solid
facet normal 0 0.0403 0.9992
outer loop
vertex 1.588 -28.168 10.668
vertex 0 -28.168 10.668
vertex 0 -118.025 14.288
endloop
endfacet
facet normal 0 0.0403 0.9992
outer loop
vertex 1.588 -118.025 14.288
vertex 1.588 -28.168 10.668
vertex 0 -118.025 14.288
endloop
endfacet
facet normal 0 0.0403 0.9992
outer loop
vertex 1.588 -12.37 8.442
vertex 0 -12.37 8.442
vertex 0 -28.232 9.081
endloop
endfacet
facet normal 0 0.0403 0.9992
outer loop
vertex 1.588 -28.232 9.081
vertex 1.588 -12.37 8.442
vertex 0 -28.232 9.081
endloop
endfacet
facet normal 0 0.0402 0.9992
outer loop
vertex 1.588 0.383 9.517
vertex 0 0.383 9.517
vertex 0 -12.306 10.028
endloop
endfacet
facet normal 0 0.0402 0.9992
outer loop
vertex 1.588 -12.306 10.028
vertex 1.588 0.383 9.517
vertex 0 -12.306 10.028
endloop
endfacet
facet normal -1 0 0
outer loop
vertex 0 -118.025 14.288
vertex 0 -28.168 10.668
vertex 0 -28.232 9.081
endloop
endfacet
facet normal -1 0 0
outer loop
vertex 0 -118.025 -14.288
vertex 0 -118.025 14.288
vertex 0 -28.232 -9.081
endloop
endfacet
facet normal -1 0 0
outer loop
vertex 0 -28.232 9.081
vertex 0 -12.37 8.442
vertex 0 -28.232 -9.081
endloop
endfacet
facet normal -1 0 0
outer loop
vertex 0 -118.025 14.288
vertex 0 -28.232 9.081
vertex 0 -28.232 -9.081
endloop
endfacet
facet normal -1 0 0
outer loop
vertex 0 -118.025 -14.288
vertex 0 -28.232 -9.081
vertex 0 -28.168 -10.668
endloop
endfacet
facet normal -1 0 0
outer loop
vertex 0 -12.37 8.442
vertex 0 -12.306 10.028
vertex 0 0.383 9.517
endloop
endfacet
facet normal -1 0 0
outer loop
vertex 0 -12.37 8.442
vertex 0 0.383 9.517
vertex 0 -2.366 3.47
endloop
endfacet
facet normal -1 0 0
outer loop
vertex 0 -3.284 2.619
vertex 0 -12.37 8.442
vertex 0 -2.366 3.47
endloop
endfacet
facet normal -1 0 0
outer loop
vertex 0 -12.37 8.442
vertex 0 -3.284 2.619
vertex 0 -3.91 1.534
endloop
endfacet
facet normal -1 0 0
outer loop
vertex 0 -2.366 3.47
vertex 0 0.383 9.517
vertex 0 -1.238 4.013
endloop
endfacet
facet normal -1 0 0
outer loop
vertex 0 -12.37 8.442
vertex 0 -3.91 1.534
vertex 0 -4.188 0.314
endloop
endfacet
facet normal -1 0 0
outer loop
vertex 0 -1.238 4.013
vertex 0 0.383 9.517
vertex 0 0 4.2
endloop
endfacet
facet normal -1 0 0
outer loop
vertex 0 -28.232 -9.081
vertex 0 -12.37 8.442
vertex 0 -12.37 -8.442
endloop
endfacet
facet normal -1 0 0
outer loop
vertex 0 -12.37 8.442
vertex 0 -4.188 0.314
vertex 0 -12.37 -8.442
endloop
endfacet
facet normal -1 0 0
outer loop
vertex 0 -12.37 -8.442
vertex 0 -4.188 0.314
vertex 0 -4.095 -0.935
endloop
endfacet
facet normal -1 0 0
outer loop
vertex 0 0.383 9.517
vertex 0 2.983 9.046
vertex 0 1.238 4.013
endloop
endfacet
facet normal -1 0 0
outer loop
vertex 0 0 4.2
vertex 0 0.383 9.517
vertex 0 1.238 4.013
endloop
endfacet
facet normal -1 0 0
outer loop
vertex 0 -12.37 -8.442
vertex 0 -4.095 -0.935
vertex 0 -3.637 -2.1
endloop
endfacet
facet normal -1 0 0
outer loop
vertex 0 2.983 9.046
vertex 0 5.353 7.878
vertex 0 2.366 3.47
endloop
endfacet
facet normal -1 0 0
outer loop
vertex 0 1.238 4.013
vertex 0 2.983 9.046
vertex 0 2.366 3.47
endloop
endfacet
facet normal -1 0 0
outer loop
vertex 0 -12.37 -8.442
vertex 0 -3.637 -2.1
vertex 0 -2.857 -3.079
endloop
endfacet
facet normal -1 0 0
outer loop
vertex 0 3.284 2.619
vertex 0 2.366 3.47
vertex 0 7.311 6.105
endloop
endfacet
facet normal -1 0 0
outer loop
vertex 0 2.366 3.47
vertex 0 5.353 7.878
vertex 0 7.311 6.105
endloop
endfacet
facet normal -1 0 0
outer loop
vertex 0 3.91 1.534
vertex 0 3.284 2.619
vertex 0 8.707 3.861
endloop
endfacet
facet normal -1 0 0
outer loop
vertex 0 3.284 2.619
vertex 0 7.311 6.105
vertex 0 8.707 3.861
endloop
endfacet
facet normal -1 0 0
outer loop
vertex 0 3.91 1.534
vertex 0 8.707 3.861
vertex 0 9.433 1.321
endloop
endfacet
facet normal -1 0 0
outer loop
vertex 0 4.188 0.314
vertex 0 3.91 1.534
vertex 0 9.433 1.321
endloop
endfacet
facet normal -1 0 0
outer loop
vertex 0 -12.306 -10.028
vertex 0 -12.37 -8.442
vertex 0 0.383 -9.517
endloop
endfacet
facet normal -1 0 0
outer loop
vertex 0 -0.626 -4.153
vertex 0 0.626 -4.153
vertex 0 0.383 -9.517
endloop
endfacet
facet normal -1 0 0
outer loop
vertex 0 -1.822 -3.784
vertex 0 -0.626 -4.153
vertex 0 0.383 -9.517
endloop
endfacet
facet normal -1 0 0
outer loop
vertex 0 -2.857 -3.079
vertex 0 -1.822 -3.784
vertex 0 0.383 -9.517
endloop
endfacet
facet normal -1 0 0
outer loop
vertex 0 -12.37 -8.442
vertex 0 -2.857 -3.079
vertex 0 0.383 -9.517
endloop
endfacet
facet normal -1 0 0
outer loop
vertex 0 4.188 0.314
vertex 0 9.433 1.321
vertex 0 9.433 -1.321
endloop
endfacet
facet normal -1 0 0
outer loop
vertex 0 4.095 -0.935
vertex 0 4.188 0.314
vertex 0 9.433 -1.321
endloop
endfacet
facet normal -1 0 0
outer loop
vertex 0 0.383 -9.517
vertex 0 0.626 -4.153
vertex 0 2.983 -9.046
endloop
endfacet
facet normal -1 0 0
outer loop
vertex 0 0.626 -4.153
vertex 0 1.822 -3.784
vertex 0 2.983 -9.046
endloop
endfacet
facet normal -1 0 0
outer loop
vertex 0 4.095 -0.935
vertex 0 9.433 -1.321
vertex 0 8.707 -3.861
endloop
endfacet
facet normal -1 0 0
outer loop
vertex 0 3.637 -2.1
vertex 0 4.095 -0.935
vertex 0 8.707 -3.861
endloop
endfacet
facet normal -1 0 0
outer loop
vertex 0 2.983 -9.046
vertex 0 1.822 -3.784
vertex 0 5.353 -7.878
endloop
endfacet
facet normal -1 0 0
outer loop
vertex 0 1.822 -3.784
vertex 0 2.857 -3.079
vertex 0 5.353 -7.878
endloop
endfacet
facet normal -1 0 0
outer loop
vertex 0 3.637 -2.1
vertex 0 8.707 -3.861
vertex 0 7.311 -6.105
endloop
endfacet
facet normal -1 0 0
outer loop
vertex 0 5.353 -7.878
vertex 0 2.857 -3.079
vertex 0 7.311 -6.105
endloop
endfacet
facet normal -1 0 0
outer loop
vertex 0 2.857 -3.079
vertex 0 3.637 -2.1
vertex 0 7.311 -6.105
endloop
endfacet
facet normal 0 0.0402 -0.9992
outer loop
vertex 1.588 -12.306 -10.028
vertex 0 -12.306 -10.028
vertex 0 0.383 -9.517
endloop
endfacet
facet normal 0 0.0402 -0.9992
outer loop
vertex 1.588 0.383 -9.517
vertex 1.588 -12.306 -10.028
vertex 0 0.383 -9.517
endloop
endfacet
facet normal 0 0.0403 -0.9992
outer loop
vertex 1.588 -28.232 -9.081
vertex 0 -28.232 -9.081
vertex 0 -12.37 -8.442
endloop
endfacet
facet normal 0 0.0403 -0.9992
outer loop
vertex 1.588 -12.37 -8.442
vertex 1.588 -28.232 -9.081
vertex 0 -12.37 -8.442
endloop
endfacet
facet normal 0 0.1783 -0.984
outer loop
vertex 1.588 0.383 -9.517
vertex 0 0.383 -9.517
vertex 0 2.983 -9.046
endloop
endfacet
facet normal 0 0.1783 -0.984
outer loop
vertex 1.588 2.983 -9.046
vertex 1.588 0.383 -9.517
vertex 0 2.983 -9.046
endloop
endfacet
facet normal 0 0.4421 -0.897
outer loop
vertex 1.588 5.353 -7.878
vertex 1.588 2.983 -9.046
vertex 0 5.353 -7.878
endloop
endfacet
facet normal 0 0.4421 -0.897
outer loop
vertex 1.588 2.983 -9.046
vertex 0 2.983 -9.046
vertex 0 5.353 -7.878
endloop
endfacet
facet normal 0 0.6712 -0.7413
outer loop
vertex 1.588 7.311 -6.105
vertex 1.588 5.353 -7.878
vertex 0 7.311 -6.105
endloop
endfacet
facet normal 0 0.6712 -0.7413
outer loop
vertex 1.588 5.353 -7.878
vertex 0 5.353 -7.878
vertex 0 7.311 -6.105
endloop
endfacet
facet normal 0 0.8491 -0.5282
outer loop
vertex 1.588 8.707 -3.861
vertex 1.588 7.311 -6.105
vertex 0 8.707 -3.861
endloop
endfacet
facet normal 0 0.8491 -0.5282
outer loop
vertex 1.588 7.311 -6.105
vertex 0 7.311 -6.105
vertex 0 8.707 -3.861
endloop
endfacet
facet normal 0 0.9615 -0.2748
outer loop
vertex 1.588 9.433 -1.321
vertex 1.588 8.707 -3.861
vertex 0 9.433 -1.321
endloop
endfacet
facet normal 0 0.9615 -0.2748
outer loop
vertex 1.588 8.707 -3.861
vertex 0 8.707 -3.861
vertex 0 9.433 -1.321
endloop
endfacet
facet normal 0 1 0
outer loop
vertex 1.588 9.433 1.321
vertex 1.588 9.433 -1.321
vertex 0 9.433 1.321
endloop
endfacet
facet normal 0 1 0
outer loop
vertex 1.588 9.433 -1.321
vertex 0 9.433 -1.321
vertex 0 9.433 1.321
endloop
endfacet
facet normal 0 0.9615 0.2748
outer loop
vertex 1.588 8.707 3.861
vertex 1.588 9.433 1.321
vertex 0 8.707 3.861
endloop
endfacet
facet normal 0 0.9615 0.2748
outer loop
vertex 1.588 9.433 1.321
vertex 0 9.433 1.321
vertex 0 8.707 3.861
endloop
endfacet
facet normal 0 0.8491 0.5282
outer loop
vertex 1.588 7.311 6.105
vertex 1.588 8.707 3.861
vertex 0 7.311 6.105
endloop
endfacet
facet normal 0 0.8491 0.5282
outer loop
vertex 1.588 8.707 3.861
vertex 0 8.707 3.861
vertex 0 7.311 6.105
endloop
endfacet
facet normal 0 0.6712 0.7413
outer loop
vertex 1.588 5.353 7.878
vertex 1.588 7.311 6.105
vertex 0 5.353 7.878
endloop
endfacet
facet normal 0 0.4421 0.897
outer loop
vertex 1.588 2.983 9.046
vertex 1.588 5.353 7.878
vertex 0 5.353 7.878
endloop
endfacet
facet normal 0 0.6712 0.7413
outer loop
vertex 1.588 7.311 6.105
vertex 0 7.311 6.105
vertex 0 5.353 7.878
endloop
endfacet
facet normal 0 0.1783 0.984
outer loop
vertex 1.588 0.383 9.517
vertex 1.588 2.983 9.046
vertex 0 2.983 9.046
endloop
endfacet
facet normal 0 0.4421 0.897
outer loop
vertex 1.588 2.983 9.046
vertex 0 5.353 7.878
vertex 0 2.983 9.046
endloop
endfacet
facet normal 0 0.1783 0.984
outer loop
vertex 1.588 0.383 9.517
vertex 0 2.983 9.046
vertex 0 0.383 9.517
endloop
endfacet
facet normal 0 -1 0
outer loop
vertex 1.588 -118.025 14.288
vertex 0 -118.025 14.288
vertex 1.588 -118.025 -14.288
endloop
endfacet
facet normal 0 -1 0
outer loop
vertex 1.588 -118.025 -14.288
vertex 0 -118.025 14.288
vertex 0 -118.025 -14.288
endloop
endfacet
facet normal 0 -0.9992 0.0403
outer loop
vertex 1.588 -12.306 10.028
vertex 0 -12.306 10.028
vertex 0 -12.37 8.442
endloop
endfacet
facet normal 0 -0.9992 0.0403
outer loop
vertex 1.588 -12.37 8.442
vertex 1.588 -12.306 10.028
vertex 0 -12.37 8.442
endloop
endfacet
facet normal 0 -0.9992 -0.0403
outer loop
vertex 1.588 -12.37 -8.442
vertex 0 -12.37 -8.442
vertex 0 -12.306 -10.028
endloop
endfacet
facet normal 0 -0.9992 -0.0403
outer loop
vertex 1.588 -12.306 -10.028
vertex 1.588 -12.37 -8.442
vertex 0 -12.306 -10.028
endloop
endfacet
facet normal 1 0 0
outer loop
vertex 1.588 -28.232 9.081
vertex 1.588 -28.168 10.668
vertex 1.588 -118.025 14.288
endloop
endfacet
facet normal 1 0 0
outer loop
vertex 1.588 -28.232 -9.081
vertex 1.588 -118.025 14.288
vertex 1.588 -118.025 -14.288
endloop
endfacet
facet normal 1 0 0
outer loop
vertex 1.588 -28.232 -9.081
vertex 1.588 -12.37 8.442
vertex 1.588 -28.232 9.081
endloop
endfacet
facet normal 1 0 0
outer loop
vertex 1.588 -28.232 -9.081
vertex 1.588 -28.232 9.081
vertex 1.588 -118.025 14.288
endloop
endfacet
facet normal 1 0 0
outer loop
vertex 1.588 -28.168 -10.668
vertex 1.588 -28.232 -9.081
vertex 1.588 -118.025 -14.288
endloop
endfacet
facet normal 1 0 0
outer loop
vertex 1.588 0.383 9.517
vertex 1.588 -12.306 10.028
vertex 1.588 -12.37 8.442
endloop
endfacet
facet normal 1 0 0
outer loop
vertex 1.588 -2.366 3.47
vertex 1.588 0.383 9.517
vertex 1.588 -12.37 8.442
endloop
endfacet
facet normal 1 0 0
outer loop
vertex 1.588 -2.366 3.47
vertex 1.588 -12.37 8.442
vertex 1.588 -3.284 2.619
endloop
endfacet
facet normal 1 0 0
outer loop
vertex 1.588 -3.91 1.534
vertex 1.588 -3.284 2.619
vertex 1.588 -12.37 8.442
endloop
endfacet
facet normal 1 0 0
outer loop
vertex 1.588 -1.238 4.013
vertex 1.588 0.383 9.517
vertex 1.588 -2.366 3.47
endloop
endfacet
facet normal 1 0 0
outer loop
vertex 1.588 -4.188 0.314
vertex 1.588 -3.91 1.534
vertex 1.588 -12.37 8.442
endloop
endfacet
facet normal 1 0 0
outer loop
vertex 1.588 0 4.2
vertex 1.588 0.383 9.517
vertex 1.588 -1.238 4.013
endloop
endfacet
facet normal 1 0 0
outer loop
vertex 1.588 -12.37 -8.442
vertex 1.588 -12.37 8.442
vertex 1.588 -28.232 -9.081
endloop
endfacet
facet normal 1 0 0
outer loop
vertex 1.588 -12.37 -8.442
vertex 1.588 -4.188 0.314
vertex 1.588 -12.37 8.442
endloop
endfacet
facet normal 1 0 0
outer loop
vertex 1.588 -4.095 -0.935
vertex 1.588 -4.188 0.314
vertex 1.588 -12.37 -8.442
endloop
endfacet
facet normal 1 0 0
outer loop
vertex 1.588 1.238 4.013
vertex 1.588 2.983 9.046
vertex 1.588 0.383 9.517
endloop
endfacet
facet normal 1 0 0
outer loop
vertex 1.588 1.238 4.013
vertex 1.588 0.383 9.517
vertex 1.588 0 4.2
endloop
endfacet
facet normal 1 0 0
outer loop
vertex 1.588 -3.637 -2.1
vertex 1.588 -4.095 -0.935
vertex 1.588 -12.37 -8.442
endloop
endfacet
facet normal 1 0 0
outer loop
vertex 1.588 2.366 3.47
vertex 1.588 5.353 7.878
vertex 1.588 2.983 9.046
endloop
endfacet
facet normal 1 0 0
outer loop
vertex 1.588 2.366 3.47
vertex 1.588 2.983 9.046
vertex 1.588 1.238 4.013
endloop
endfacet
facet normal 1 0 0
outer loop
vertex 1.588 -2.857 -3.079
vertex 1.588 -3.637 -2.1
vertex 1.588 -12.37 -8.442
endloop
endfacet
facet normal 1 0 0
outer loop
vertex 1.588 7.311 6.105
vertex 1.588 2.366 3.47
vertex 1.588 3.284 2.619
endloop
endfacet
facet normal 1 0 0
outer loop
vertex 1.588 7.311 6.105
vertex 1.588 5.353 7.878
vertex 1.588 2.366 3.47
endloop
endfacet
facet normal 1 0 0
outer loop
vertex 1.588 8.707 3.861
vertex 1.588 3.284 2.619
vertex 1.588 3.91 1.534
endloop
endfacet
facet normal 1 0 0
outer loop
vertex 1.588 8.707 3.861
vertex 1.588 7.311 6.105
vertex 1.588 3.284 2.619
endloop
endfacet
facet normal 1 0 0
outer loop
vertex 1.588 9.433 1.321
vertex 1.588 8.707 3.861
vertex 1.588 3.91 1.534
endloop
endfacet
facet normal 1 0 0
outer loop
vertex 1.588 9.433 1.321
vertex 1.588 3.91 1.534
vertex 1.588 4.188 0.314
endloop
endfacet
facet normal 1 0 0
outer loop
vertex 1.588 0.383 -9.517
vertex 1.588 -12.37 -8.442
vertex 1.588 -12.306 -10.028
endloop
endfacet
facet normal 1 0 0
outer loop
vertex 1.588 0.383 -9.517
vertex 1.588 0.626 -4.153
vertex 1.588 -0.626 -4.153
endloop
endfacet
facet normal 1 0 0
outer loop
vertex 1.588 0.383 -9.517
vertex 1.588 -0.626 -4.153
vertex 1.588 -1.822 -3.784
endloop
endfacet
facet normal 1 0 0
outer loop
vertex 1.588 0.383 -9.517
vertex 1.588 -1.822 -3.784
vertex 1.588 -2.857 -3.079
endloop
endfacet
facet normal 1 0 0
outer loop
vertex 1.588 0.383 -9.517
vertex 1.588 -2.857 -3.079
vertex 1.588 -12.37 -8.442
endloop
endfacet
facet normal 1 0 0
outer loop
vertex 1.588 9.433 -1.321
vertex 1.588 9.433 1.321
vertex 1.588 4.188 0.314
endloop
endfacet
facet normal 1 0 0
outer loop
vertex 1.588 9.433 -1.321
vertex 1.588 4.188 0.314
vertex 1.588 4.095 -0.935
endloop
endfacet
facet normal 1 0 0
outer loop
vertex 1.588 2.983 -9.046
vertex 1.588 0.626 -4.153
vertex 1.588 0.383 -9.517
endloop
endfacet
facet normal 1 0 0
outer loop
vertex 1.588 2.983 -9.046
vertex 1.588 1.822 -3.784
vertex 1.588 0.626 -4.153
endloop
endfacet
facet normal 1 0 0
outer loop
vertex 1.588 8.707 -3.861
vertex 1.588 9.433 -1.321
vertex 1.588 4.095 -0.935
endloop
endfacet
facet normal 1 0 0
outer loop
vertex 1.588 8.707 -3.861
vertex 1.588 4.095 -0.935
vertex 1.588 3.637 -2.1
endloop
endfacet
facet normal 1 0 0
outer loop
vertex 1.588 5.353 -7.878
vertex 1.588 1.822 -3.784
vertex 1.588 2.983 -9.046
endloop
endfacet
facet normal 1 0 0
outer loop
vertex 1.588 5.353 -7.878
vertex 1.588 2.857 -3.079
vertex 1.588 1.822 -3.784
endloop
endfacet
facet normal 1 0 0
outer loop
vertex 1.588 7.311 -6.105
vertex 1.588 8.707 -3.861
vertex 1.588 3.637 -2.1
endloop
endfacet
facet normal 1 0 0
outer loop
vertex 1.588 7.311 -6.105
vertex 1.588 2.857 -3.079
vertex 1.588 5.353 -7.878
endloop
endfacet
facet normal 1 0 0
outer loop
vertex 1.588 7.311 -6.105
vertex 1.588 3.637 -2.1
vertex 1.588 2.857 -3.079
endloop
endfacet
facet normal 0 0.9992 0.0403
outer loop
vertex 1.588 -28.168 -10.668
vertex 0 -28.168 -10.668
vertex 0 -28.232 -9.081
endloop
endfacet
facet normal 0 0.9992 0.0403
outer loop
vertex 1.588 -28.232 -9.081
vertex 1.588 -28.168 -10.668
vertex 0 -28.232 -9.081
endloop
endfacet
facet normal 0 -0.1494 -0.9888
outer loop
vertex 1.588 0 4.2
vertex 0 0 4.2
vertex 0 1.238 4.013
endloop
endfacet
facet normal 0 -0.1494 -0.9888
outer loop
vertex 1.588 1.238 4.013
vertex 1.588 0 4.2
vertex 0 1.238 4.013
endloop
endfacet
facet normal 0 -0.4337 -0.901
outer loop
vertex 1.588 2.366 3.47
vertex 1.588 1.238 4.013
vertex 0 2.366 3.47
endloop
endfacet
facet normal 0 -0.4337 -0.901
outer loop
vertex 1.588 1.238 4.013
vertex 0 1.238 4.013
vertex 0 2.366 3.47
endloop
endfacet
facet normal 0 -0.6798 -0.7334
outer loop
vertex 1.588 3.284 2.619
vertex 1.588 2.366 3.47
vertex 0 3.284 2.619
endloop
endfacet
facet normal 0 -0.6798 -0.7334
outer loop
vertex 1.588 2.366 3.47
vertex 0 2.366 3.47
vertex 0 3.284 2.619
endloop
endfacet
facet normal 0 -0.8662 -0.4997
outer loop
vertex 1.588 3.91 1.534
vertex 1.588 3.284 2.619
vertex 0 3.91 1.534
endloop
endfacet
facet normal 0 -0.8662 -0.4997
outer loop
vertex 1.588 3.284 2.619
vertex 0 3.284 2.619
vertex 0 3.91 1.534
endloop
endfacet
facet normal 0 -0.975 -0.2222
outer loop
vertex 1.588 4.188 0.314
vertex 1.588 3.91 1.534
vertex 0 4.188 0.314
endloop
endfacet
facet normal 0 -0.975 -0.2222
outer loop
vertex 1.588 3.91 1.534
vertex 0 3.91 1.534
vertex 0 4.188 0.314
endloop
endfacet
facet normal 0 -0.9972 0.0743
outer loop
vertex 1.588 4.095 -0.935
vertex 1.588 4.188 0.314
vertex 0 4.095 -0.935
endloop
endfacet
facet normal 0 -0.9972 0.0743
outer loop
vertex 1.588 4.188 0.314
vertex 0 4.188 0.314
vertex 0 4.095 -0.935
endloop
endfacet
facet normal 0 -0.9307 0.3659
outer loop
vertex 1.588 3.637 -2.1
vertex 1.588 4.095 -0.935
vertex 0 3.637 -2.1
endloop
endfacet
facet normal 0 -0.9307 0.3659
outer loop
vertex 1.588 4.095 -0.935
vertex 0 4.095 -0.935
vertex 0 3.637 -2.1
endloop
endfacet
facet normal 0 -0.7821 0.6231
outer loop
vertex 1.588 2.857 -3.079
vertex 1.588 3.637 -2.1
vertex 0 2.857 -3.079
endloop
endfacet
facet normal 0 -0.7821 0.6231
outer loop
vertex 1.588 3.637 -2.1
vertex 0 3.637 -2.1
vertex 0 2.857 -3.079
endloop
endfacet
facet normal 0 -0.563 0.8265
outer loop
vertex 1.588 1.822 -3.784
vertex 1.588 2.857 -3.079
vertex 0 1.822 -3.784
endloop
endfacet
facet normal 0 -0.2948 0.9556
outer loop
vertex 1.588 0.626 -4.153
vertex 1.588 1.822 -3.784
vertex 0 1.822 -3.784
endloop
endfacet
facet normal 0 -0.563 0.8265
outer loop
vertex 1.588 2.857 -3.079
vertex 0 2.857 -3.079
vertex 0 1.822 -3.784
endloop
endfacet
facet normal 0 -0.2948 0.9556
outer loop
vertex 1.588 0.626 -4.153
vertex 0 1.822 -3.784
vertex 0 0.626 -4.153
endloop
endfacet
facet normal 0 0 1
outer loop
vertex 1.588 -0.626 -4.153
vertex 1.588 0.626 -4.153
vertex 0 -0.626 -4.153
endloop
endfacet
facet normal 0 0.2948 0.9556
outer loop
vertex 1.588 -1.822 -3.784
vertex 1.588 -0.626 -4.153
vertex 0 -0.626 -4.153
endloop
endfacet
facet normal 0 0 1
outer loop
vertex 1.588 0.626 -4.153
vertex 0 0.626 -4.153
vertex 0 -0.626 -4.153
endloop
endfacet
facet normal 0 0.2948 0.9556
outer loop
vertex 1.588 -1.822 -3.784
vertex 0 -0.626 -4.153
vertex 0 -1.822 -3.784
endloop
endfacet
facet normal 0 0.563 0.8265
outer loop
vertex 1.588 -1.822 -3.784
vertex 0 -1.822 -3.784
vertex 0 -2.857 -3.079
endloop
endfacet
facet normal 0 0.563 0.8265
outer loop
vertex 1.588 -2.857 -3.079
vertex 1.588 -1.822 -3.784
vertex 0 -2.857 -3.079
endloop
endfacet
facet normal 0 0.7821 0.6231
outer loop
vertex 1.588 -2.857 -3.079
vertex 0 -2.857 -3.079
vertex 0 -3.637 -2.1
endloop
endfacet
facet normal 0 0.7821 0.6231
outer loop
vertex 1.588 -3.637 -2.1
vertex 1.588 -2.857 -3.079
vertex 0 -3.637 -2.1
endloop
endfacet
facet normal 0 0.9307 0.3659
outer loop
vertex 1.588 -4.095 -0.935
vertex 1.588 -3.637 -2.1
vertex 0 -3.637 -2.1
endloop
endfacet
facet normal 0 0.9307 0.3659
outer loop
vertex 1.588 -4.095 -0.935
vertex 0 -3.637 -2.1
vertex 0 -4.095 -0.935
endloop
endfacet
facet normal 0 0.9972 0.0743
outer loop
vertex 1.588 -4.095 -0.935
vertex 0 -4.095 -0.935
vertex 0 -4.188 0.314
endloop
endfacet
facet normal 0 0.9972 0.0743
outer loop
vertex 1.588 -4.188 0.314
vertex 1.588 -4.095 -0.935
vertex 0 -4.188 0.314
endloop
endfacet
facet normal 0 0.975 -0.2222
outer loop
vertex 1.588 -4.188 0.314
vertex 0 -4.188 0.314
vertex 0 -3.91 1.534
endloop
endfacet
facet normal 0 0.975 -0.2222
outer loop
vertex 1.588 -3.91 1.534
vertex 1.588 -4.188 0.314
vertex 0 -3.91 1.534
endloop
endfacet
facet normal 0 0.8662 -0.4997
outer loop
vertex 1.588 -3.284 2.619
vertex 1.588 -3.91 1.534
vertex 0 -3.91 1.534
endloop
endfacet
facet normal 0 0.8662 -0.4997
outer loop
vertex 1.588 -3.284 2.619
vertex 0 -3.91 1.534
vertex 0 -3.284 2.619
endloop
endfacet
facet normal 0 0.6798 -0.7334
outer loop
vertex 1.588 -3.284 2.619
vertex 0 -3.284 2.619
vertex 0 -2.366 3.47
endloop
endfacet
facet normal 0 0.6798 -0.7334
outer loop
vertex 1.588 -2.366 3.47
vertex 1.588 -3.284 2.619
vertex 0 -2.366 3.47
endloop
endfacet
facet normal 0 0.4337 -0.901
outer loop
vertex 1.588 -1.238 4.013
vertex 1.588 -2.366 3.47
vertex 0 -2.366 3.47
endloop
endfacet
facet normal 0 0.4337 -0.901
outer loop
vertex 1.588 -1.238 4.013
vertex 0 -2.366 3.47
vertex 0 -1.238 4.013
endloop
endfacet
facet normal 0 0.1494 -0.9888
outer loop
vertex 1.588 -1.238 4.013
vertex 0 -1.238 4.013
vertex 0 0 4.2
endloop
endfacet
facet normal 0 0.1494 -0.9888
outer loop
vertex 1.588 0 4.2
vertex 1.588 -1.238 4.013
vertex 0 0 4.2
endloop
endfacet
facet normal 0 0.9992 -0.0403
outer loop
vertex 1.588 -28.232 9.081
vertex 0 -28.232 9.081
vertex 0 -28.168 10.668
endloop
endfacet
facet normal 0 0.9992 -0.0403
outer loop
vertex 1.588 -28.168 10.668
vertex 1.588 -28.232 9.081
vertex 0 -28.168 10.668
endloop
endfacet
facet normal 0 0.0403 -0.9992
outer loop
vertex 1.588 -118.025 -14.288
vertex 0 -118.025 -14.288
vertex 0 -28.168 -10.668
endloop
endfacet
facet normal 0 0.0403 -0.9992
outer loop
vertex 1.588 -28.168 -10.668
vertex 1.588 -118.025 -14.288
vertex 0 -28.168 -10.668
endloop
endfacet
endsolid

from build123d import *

# Parameters (mm, degrees)
BOSS_EXTRUDE1_DEPTH  = 1.5875
M8_CLEARANCE_HOLE1_D = 8.4


with BuildPart() as part:
    # Sketch1 → Boss-Extrude1 (new body)
    with BuildSketch(Plane(origin=(0, 0, 0), x_dir=(0, 0, -1), z_dir=(1, 0, 0))):
        with BuildLine():
            Line((-14.2875, -118.025122157), (0, -118.025122157))
            Line((0, -118.025122157), (14.2875, -118.025122157))
            Line((14.2875, -118.025122157), (10.667522727, -28.168425744))
            Line((10.667522727, -28.168425744), (9.081309394, -28.232328118))
            Line((9.081309394, -28.232328118), (8.442285655, -12.370194791))
            Line((8.442285655, -12.370194791), (10.028498987, -12.306292417))
            Line((10.028498987, -12.306292417), (9.517279996, 0.383414244))
            ThreePointArc((9.517279996, 0.383414244), (0, 9.525), (-9.517279996, 0.383414244))
            Line((-9.517279996, 0.383414244), (-10.028498987, -12.306292417))
            Line((-10.028498987, -12.306292417), (-8.442285655, -12.370194791))
            Line((-8.442285655, -12.370194791), (-9.081309394, -28.232328118))
            Line((-9.081309394, -28.232328118), (-10.667522727, -28.168425744))
            Line((-10.667522727, -28.168425744), (-14.2875, -118.025122157))
        make_face()
    extrude(amount=BOSS_EXTRUDE1_DEPTH)

    # M8 Clearance Hole1 (through all)
    with Locations(Plane(origin=(1.5875, 0, 0), x_dir=(0, 0, -1), z_dir=(1, 0, 0))):
        with Locations((0, 0)):
            Hole(M8_CLEARANCE_HOLE1_D / 2)


solid = part.part
